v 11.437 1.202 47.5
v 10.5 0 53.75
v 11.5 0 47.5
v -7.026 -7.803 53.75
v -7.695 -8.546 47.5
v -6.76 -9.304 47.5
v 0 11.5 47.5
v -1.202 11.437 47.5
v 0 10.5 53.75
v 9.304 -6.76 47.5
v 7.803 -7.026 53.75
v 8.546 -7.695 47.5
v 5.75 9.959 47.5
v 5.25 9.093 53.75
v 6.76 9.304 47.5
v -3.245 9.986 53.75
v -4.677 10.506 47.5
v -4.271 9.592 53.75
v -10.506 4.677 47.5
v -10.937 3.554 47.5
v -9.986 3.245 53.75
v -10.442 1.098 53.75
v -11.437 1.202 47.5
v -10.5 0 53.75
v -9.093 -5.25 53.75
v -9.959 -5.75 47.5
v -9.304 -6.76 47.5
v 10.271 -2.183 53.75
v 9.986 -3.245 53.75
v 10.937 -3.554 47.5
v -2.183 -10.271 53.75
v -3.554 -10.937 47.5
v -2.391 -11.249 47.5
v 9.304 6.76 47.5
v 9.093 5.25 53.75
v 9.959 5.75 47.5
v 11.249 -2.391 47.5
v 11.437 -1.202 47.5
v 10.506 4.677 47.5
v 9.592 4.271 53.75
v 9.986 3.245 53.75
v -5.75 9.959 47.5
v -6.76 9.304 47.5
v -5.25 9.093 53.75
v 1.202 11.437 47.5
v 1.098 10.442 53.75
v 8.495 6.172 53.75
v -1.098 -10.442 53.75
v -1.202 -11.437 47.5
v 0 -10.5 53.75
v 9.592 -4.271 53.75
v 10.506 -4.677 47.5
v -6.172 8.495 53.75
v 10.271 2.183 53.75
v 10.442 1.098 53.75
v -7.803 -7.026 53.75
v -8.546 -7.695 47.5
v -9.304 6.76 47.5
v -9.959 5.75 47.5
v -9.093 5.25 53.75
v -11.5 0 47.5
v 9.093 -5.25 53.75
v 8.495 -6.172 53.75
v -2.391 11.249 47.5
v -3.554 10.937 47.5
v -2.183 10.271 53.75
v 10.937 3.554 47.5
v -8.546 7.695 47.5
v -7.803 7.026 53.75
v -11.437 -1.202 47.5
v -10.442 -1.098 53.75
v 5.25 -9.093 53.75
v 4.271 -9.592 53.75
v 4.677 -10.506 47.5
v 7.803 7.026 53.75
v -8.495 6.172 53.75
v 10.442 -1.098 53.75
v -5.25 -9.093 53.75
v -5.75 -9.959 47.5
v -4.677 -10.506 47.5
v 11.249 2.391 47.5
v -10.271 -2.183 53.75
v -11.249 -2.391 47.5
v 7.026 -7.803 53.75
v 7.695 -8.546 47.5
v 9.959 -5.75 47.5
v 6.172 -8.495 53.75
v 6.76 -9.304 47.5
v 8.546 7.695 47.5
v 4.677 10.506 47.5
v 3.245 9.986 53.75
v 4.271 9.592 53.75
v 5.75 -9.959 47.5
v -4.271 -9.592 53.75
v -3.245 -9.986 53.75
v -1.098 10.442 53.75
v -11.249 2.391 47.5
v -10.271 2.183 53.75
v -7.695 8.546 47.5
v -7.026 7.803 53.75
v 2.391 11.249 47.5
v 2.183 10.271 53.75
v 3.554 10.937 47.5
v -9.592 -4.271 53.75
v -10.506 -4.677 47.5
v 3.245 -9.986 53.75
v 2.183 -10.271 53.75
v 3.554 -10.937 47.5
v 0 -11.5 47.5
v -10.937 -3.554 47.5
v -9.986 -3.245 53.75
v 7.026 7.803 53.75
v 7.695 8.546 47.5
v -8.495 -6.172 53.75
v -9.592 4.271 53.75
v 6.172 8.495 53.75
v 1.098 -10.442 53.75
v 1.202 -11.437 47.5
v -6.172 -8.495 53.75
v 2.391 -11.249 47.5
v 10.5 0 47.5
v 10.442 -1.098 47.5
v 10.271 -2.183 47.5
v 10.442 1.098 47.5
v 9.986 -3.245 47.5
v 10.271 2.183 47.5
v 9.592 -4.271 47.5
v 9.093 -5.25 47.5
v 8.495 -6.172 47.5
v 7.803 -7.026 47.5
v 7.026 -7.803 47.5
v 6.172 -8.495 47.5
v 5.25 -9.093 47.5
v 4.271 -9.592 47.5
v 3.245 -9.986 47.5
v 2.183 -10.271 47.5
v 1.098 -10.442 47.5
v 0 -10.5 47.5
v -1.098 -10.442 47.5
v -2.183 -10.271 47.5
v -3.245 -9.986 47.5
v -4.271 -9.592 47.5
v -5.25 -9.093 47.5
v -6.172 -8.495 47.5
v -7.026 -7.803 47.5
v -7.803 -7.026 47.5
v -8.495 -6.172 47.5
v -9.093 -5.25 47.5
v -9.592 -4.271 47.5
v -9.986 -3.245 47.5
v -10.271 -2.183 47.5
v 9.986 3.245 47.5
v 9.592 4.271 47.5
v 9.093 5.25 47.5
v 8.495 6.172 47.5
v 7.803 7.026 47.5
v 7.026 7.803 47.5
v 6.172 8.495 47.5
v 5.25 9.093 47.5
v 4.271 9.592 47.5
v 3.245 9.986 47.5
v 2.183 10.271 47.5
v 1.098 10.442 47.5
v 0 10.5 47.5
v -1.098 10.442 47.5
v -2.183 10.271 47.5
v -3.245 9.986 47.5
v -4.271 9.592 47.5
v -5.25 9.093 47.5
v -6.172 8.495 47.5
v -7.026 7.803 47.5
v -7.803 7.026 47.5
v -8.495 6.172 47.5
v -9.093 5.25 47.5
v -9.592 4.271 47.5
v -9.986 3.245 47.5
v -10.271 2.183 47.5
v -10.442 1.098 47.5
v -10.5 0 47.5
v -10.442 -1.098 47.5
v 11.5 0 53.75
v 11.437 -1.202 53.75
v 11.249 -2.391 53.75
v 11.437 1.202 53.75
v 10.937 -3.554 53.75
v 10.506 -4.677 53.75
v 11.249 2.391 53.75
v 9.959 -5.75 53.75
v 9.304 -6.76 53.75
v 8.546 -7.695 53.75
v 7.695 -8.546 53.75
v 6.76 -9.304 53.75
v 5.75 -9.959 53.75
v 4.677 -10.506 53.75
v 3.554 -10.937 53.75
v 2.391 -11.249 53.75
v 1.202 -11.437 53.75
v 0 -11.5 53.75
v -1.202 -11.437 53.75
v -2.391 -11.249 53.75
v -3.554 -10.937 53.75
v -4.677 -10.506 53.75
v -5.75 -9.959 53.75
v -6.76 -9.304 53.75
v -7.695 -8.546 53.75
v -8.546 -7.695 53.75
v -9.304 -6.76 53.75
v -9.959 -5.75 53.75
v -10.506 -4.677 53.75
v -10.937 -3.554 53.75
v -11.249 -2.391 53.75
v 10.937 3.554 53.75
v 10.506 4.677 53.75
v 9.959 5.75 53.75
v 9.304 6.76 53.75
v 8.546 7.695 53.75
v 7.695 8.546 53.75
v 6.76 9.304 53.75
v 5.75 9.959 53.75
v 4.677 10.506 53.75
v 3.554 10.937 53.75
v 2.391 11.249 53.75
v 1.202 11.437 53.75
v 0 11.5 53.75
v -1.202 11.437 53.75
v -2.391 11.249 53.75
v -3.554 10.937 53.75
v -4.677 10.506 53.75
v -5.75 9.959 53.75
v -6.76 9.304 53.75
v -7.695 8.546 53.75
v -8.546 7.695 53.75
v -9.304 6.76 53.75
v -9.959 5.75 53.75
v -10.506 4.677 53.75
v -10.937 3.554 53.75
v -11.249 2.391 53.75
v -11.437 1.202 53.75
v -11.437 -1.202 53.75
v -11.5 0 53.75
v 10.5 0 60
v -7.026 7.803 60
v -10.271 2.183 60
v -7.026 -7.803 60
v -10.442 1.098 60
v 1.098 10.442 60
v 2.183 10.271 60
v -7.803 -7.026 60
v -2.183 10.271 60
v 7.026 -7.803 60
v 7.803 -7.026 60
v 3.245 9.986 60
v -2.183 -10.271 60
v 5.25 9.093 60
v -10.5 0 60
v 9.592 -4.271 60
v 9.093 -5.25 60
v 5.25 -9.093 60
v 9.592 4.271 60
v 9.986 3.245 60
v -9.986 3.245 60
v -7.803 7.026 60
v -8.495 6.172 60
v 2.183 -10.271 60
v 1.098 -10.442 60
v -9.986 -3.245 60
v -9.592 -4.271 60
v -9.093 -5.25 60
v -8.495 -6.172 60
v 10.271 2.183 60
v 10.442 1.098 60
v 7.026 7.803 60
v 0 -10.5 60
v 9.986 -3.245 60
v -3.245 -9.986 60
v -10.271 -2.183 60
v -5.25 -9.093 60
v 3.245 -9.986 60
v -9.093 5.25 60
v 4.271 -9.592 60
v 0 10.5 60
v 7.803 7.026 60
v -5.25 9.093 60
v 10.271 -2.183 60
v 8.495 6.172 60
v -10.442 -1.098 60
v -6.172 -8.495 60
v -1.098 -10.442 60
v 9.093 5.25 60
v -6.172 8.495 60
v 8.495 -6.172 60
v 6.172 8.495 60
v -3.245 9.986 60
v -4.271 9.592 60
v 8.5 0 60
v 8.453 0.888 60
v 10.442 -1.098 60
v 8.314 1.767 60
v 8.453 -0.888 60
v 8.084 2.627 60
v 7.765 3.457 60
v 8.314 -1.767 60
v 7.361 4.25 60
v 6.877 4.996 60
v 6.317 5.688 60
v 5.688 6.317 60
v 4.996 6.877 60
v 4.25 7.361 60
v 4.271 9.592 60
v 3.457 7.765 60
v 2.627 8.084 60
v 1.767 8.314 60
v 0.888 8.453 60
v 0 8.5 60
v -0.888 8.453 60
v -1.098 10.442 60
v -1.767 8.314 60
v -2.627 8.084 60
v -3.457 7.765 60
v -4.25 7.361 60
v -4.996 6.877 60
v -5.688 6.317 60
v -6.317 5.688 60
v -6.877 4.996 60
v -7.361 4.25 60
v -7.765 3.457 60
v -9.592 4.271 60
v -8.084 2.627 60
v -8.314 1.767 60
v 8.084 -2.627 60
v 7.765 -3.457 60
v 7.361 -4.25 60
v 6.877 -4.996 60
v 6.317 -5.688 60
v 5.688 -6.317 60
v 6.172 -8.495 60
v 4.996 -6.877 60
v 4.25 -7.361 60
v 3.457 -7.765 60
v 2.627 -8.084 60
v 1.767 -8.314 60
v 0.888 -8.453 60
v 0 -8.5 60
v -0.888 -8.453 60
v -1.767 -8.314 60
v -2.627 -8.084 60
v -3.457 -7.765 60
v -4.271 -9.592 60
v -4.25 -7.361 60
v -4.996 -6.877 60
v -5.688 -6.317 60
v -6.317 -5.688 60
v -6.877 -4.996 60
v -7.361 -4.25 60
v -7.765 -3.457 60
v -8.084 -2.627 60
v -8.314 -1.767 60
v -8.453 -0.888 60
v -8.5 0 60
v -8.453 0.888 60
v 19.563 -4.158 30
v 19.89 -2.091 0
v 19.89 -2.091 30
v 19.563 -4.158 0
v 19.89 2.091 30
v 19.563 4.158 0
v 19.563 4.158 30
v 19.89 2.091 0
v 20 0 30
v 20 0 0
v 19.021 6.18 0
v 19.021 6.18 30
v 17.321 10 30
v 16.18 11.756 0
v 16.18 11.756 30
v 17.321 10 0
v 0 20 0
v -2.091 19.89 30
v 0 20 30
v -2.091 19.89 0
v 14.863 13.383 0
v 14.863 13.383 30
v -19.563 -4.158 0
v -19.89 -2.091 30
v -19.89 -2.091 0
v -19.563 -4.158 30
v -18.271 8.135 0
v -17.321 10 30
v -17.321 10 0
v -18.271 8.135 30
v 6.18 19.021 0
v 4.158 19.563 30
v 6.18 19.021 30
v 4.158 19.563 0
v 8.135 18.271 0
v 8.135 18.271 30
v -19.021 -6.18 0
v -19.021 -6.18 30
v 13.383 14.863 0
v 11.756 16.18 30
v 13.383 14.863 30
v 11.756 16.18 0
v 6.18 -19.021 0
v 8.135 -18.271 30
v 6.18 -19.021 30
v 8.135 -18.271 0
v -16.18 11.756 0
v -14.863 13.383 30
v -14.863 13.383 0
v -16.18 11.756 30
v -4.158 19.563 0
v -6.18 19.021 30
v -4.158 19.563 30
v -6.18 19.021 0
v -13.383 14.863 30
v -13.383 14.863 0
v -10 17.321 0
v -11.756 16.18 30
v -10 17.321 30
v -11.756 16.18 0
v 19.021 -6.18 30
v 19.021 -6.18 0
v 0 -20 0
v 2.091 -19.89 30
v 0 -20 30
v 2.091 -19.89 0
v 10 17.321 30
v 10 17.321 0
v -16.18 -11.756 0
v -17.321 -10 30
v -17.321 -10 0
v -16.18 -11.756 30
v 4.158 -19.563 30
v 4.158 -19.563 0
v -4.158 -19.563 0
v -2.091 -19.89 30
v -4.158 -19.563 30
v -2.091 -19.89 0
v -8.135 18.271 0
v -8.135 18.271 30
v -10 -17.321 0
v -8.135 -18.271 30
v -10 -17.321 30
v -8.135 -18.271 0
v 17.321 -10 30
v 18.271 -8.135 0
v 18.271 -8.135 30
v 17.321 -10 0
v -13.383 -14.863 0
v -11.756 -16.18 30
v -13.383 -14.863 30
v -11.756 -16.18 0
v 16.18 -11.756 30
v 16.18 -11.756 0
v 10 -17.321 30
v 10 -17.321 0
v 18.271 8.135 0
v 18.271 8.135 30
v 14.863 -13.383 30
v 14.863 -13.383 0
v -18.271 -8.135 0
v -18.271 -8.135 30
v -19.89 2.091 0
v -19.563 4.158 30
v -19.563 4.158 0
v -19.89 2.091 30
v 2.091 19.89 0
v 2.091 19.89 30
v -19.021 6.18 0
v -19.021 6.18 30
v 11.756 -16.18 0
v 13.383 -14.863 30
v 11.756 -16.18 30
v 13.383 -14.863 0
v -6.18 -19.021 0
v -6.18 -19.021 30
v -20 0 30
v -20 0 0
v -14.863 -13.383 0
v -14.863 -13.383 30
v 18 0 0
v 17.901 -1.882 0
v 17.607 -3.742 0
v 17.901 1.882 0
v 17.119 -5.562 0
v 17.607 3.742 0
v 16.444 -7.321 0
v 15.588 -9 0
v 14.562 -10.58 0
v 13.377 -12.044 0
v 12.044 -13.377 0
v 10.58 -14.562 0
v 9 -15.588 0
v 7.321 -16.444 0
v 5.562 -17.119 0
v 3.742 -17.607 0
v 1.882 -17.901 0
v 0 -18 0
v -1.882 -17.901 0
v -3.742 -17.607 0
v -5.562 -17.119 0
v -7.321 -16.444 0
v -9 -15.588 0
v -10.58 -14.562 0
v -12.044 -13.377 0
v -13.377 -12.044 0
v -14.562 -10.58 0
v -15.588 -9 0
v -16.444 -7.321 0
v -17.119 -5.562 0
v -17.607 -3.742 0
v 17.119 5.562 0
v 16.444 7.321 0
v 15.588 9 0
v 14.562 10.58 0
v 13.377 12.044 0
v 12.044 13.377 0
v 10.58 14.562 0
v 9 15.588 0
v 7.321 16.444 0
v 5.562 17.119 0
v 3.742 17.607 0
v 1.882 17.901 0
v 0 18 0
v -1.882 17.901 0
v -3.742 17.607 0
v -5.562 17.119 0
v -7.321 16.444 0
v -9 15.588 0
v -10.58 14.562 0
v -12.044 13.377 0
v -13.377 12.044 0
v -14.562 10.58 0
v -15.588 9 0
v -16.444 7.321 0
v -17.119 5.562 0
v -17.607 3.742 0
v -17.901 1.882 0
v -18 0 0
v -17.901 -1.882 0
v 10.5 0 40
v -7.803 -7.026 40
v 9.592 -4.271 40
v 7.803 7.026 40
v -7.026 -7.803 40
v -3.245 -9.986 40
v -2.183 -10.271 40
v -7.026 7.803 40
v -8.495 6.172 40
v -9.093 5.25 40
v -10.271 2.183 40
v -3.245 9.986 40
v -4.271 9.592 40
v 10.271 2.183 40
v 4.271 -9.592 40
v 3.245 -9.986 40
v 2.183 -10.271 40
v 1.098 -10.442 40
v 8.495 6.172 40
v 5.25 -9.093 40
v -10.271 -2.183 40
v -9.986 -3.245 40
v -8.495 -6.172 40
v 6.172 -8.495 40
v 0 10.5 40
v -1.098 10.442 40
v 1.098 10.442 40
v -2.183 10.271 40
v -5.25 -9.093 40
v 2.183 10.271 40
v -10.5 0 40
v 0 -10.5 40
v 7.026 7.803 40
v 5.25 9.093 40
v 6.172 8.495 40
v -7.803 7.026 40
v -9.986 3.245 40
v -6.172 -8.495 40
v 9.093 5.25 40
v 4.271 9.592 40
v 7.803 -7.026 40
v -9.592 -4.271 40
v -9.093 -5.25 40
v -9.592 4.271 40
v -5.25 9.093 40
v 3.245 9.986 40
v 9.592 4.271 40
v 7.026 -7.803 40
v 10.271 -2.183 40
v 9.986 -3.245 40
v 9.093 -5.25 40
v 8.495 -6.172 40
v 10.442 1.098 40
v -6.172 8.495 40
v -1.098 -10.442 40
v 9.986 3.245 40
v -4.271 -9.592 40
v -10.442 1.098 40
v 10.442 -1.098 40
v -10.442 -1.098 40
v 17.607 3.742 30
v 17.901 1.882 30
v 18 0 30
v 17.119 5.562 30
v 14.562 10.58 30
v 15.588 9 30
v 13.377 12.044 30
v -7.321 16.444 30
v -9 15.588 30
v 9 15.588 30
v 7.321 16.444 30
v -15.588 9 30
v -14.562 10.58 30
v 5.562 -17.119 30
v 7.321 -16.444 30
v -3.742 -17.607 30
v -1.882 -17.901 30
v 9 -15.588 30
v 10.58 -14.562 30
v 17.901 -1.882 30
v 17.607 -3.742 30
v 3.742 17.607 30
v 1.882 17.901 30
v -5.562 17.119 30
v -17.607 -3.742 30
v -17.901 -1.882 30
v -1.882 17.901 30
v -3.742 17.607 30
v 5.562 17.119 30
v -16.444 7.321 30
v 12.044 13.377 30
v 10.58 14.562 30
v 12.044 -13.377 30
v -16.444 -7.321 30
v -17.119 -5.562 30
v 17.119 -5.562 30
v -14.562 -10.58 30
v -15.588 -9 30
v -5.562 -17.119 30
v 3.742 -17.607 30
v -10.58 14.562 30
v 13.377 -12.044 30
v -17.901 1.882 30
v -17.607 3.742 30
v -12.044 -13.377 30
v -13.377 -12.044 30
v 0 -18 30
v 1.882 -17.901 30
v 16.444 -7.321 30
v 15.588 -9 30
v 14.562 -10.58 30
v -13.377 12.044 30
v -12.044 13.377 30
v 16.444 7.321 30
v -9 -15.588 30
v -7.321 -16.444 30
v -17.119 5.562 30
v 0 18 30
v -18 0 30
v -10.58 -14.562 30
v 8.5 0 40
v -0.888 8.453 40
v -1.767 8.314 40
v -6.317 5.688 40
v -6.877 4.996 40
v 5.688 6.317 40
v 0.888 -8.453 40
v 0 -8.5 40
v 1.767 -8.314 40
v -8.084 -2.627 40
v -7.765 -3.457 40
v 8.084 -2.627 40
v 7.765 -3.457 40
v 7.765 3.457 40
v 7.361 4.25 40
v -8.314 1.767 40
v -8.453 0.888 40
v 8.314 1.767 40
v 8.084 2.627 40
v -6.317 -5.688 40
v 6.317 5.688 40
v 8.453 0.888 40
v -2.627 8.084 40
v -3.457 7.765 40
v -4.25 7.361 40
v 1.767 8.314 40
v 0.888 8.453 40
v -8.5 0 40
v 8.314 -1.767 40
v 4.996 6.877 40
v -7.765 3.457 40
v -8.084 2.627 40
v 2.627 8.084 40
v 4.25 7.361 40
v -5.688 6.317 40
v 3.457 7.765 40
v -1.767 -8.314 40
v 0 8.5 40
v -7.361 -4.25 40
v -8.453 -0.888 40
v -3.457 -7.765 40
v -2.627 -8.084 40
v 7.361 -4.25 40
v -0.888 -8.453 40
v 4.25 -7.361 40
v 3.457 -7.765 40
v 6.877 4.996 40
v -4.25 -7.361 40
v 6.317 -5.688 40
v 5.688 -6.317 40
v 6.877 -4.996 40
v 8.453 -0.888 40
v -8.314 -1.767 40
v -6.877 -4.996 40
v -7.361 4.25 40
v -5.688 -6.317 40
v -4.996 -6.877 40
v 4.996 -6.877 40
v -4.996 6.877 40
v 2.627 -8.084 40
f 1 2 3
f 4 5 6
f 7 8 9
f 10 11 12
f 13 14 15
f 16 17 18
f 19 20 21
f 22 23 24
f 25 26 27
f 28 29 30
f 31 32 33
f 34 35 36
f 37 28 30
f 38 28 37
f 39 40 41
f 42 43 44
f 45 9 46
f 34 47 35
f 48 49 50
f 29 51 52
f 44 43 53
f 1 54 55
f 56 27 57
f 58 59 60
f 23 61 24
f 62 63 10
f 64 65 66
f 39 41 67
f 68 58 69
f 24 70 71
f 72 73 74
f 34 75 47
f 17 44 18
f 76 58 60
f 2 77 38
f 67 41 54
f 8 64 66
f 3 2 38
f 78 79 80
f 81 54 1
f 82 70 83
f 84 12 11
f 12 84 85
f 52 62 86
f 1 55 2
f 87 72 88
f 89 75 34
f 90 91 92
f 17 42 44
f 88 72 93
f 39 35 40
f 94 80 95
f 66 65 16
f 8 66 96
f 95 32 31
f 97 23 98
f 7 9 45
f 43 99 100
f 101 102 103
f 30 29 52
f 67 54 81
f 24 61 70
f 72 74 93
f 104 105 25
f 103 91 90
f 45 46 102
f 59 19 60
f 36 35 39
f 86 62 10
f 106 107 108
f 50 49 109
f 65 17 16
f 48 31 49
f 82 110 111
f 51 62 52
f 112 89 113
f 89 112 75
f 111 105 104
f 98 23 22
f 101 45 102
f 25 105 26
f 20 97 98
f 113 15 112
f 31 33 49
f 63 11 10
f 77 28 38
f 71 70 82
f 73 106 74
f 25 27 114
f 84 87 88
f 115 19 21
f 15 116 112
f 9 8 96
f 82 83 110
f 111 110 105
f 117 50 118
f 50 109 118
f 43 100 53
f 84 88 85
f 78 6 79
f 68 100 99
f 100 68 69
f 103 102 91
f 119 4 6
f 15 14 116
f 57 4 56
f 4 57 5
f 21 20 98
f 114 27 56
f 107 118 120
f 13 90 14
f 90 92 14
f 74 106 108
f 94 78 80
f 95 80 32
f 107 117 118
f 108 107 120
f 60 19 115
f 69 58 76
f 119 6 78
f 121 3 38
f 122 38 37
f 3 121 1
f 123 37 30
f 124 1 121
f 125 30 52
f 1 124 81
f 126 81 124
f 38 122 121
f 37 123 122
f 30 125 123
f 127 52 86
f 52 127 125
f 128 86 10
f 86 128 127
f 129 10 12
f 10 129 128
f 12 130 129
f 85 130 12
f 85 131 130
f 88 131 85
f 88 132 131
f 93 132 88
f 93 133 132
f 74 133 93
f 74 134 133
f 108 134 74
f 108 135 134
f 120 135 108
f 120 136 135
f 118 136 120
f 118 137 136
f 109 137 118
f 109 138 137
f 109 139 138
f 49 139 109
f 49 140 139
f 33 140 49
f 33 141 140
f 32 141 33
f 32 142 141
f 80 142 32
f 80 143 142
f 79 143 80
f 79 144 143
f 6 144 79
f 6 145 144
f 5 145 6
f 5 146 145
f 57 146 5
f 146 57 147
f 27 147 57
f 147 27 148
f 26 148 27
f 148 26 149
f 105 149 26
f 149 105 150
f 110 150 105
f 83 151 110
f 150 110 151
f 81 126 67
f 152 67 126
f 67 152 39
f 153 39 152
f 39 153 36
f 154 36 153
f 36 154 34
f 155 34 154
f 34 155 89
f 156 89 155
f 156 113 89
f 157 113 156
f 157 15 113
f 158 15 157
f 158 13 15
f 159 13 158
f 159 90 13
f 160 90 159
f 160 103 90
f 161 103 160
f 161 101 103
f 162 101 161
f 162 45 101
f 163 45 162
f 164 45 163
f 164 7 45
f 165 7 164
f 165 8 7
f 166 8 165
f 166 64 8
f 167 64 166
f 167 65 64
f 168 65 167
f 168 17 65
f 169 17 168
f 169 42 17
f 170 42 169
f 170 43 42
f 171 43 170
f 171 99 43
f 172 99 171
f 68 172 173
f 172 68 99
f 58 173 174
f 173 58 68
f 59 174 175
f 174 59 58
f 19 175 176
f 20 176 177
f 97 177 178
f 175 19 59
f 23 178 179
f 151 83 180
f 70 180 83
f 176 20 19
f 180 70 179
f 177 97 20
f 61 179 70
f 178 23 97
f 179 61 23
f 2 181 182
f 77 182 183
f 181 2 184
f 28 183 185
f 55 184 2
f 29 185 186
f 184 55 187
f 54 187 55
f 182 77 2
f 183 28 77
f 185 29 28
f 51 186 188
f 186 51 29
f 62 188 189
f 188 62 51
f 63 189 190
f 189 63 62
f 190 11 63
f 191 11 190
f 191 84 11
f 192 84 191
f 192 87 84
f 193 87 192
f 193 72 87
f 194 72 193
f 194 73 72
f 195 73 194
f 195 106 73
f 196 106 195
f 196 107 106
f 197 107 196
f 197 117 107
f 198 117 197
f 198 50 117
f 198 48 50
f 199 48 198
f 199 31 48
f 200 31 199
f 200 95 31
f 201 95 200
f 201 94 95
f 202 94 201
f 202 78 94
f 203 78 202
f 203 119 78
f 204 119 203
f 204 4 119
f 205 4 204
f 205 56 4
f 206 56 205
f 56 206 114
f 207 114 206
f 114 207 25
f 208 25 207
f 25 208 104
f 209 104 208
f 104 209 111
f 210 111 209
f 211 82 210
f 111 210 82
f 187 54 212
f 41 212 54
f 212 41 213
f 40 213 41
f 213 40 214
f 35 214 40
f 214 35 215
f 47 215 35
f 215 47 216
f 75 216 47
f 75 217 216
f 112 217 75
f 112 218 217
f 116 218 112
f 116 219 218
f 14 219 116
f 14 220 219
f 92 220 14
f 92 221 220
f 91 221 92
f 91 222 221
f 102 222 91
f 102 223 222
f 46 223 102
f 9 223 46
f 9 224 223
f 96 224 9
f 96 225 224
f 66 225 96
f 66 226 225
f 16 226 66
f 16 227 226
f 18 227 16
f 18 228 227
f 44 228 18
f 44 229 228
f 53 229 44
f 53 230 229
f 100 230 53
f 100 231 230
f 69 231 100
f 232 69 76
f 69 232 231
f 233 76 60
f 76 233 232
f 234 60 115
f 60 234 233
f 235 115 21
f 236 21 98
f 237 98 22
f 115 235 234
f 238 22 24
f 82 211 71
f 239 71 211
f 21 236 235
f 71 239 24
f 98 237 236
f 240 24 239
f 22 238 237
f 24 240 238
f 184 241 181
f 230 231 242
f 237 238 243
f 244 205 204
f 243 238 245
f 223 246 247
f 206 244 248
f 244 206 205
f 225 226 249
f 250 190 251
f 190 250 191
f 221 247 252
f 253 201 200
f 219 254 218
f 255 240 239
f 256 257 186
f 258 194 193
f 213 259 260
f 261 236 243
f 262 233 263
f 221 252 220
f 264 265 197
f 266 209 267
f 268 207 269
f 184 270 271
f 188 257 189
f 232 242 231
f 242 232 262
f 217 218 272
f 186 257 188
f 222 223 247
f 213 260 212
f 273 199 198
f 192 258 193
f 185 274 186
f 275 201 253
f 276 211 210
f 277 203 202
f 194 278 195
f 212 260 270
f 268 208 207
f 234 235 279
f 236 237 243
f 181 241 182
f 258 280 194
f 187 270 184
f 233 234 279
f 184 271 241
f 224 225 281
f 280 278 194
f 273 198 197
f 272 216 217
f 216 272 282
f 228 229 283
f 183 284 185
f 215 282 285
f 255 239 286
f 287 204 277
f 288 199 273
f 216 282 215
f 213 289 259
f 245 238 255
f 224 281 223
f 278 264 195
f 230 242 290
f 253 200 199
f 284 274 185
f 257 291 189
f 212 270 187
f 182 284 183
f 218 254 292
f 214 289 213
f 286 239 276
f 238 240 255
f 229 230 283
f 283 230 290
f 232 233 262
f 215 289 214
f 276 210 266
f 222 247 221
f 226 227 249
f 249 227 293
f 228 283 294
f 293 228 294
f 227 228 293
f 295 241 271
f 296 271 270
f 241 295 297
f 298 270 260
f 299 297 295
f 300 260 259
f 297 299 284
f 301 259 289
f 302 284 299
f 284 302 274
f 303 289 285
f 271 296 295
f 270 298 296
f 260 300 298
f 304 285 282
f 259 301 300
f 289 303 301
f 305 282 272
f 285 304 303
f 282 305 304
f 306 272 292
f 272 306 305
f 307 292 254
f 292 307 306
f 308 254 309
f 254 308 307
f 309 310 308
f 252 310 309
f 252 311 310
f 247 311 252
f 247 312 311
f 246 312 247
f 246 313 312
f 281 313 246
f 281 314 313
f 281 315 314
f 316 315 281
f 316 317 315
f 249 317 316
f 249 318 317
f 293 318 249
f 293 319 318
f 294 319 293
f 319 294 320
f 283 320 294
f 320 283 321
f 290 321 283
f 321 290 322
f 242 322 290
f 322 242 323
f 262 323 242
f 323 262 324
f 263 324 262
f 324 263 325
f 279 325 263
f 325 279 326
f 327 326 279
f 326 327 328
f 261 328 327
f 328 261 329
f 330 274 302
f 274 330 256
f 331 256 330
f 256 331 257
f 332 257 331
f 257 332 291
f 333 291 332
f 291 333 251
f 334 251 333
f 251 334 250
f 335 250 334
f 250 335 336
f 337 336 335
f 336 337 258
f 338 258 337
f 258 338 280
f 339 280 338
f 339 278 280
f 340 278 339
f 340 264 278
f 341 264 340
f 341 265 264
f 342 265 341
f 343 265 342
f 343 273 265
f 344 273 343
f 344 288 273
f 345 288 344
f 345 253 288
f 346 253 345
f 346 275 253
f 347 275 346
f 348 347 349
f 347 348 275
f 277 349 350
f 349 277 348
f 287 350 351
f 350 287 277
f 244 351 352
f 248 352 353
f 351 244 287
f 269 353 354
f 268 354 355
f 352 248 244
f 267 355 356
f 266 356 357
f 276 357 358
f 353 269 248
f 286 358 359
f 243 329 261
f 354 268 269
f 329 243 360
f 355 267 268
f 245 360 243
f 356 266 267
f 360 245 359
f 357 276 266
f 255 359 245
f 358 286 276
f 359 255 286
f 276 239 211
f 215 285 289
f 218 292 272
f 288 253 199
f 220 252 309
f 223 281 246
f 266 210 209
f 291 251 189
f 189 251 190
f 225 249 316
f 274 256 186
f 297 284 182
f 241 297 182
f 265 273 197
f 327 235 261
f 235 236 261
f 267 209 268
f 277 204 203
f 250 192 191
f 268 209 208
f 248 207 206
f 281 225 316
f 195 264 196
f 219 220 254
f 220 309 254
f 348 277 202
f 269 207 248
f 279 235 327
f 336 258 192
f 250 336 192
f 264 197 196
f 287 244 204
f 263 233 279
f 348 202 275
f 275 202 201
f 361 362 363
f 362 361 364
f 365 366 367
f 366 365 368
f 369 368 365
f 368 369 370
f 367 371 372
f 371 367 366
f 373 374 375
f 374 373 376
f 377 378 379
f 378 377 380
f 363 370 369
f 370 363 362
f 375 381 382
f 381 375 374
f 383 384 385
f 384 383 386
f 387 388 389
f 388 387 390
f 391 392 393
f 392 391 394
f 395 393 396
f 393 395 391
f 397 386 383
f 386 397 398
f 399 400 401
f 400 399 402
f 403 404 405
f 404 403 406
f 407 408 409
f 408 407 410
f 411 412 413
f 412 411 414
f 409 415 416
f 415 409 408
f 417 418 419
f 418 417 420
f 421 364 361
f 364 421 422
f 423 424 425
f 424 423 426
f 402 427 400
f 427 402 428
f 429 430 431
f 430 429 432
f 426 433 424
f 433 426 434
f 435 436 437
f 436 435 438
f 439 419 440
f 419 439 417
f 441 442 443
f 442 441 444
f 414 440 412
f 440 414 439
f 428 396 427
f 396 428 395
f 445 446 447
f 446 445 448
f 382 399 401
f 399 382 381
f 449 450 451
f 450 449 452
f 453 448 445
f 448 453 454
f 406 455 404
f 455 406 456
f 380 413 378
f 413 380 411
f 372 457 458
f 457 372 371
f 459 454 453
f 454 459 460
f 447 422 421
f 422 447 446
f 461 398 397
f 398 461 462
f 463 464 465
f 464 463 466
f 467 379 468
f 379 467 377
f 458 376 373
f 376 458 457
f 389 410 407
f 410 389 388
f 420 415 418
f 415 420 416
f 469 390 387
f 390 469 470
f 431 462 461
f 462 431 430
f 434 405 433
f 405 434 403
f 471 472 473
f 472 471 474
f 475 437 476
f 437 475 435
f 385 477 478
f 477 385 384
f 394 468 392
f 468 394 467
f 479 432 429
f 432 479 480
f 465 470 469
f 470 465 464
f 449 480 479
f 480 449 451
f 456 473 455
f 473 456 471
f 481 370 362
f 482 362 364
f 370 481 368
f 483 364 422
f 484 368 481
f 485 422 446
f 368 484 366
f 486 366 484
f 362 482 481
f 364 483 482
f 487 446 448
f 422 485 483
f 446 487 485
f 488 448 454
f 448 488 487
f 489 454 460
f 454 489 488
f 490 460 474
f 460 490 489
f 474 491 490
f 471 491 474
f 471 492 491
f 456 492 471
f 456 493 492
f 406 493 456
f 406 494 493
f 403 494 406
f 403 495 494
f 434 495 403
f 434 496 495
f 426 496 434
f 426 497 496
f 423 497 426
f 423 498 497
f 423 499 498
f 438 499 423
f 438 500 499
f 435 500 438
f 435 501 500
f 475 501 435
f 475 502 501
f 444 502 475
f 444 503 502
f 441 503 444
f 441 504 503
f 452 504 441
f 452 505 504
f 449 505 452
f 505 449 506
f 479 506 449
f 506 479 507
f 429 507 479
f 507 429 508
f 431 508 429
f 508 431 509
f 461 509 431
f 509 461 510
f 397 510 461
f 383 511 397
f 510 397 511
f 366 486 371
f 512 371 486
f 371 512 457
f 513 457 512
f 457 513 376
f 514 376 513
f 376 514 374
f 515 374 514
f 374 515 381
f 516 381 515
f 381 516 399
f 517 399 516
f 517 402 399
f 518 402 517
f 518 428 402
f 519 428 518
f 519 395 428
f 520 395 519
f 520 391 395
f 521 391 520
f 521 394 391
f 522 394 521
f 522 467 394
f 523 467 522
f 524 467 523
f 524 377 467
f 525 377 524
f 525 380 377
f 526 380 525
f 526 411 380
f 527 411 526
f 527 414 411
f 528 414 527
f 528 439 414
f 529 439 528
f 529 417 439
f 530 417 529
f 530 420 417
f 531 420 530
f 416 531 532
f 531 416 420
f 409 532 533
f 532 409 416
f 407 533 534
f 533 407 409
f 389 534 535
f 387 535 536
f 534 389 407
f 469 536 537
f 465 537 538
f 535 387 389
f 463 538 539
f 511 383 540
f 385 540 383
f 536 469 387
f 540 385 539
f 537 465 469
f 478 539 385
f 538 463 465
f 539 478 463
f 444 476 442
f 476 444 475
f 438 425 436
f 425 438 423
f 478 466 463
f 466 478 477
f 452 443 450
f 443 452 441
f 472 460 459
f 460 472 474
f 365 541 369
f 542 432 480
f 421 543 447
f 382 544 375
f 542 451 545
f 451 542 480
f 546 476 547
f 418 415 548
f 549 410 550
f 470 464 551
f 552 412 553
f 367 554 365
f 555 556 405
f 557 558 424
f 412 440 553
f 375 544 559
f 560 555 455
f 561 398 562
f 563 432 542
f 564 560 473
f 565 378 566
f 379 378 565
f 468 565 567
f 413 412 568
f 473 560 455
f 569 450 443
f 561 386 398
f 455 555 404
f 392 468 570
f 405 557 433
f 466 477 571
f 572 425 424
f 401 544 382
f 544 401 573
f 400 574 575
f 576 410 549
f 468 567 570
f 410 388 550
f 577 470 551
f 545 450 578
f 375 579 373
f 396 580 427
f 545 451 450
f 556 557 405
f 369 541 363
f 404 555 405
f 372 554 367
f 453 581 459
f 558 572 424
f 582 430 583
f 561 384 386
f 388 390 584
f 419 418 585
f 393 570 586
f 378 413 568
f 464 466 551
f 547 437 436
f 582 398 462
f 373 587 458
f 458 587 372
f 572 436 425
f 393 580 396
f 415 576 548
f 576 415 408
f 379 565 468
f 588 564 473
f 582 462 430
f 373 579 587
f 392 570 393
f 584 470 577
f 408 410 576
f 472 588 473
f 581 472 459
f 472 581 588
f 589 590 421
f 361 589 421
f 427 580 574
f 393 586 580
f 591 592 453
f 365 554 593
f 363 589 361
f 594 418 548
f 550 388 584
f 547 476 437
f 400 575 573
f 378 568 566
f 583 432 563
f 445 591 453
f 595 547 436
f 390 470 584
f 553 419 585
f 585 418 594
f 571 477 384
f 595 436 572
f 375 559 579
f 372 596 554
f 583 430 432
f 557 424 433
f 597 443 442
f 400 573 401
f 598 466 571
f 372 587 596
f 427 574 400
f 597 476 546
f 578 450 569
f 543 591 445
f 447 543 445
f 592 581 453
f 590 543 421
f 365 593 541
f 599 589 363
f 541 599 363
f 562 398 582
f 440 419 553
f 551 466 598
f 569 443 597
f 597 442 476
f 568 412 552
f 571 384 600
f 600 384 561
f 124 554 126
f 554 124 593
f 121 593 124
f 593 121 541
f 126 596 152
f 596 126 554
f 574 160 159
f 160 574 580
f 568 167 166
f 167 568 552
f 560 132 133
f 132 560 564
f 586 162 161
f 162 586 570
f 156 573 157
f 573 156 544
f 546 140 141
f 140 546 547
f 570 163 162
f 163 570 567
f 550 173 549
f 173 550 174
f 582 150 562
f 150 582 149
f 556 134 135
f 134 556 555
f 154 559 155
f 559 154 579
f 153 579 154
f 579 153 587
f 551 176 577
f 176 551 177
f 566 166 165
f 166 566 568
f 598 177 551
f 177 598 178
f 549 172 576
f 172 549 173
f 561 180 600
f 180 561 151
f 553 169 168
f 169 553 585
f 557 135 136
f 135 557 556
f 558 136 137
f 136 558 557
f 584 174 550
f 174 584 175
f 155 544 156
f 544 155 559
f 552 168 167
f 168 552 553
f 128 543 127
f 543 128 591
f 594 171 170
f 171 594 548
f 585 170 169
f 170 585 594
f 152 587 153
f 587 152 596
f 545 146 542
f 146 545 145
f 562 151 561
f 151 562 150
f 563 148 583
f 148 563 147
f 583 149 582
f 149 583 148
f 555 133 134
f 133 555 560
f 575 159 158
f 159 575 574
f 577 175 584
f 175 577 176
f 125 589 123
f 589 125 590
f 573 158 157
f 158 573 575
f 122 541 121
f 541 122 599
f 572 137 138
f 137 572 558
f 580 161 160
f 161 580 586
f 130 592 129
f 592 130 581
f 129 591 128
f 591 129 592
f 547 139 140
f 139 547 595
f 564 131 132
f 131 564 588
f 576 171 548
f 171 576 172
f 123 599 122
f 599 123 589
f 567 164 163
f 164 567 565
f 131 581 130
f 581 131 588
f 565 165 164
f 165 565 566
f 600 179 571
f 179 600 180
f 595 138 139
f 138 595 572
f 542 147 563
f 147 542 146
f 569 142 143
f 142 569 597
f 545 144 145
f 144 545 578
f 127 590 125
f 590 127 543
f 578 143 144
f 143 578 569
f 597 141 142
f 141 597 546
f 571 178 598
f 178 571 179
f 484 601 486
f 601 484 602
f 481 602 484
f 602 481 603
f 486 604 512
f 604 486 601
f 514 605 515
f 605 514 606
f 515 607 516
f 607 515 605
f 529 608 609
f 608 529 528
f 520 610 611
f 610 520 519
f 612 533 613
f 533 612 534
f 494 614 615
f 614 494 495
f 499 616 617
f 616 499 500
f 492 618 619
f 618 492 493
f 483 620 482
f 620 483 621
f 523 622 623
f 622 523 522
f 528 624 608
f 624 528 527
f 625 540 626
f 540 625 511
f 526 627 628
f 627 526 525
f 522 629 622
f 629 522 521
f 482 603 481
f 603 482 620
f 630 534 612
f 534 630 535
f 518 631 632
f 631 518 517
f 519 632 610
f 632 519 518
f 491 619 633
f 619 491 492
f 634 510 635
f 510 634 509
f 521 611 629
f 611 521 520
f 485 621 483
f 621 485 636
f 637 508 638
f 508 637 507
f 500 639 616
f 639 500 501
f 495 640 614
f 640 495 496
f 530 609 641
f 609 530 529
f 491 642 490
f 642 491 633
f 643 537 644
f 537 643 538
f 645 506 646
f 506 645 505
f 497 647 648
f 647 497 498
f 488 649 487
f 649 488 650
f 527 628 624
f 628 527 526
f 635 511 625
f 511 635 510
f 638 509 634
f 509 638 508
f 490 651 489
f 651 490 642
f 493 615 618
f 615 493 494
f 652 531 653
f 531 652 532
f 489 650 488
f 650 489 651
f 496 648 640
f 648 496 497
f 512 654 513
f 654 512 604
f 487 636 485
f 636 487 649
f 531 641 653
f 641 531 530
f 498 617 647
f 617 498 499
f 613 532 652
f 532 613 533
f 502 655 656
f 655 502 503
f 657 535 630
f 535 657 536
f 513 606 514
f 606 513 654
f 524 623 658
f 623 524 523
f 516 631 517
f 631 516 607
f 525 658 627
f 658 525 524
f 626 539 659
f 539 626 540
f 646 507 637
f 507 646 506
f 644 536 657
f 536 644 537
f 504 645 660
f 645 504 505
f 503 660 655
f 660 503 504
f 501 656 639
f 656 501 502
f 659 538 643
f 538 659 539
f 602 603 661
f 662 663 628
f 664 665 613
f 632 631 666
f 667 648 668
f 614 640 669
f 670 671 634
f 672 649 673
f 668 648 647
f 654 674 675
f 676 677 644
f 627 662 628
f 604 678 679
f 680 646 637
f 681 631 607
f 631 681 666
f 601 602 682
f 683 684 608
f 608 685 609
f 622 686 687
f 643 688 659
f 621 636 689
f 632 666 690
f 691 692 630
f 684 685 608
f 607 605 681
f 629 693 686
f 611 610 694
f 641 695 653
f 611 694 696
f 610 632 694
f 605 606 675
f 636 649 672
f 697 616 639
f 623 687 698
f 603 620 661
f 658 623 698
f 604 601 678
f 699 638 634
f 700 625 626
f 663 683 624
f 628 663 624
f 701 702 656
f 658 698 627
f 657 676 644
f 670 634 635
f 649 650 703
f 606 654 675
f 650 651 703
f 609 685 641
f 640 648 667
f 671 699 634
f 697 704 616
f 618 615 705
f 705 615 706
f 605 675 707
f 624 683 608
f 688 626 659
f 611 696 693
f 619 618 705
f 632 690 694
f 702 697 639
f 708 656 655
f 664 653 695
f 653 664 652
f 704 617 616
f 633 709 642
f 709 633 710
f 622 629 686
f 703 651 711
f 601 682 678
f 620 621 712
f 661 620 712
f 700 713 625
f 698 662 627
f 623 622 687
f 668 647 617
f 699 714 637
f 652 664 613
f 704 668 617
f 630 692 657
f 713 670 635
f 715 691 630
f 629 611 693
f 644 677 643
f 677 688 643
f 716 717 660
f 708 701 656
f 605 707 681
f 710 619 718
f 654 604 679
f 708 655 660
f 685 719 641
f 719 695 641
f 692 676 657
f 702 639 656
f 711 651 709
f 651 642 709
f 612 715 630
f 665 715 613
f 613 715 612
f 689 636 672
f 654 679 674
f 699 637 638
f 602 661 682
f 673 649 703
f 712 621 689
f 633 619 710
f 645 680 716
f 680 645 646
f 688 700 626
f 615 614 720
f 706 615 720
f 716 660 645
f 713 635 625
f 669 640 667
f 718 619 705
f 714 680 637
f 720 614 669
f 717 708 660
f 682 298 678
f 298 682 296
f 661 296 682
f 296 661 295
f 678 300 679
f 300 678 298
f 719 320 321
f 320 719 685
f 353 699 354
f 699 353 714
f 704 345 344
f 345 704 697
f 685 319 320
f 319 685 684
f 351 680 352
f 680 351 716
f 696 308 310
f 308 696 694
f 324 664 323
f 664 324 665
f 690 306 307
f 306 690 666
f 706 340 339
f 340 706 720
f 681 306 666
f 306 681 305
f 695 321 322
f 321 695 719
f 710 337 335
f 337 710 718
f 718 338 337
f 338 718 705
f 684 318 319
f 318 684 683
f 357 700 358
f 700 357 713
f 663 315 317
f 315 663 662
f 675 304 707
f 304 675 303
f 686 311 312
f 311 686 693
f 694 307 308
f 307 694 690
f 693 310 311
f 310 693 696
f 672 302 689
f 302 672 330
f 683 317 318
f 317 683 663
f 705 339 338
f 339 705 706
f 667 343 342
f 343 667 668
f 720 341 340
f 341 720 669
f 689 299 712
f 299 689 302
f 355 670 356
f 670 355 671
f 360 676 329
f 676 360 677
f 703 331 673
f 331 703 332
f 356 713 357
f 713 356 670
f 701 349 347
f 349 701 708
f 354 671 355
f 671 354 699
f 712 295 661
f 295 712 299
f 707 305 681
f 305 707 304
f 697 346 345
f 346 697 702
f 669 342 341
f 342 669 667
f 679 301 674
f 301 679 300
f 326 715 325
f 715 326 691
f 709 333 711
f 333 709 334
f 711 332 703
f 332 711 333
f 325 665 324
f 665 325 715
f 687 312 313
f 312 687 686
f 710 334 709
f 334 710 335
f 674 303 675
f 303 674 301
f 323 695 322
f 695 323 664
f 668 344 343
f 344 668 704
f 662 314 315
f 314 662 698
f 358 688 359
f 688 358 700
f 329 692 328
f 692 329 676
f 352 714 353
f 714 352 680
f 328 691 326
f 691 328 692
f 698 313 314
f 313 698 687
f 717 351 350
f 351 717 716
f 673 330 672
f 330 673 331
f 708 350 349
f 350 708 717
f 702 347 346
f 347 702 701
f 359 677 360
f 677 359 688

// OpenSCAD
/* [Main Dimensions] */
// Upper Diameter (mm)
UPPER_DIA = 21;
// Lower Diameter (mm)
LOWER_DIA = 40;
// Upper Length (mm)
UPPER_LENGTH = 30;
// Lower Length (mm)
LOWER_LENGTH = 30;

/* [Tooth Options] */
// Number of teeth
N_TEETH = 2;
// Depth of teeth
TOOTH_DEPTH = 1;

/* [Various] */
$fn = 60;
THICKNESS = 2;
CHAMFER_LENGTH = 10;

tooth_offset = UPPER_LENGTH / 4;
tooth_length = (UPPER_LENGTH - CHAMFER_LENGTH - tooth_offset) / N_TEETH;
tooth_outer_dia = UPPER_DIA + 2*TOOTH_DEPTH;

difference () {
    // Outer solid
    union () {
        // Lower part
        cylinder(d = LOWER_DIA, h = LOWER_LENGTH);

        // Chamfer
        translate([0 ,0, LOWER_LENGTH])
            cylinder(d1 = LOWER_DIA, d2 = UPPER_DIA, h = CHAMFER_LENGTH);

        // Upper part
        translate([0, 0, LOWER_LENGTH])
            cylinder(d = UPPER_DIA, h = UPPER_LENGTH);

        // Teeth
        if (N_TEETH > 0) {
            for (i = [0 : N_TEETH - 1]) {
                translate([0, 0, LOWER_LENGTH + CHAMFER_LENGTH + tooth_offset + i*tooth_length])
                    cylinder(d1 = tooth_outer_dia, d2 = UPPER_DIA, h = tooth_length);
            }
        }
    }

    // Hollow out
    cylinder(d = LOWER_DIA - 2*THICKNESS, h = LOWER_LENGTH);
    translate([0, 0, LOWER_LENGTH])
        cylinder(d1 = LOWER_DIA - 2*THICKNESS, d2 = UPPER_DIA - 2*THICKNESS, h = CHAMFER_LENGTH);
    translate([0, 0, LOWER_LENGTH])
        cylinder(d = UPPER_DIA - 2*THICKNESS, h = UPPER_LENGTH);
}
